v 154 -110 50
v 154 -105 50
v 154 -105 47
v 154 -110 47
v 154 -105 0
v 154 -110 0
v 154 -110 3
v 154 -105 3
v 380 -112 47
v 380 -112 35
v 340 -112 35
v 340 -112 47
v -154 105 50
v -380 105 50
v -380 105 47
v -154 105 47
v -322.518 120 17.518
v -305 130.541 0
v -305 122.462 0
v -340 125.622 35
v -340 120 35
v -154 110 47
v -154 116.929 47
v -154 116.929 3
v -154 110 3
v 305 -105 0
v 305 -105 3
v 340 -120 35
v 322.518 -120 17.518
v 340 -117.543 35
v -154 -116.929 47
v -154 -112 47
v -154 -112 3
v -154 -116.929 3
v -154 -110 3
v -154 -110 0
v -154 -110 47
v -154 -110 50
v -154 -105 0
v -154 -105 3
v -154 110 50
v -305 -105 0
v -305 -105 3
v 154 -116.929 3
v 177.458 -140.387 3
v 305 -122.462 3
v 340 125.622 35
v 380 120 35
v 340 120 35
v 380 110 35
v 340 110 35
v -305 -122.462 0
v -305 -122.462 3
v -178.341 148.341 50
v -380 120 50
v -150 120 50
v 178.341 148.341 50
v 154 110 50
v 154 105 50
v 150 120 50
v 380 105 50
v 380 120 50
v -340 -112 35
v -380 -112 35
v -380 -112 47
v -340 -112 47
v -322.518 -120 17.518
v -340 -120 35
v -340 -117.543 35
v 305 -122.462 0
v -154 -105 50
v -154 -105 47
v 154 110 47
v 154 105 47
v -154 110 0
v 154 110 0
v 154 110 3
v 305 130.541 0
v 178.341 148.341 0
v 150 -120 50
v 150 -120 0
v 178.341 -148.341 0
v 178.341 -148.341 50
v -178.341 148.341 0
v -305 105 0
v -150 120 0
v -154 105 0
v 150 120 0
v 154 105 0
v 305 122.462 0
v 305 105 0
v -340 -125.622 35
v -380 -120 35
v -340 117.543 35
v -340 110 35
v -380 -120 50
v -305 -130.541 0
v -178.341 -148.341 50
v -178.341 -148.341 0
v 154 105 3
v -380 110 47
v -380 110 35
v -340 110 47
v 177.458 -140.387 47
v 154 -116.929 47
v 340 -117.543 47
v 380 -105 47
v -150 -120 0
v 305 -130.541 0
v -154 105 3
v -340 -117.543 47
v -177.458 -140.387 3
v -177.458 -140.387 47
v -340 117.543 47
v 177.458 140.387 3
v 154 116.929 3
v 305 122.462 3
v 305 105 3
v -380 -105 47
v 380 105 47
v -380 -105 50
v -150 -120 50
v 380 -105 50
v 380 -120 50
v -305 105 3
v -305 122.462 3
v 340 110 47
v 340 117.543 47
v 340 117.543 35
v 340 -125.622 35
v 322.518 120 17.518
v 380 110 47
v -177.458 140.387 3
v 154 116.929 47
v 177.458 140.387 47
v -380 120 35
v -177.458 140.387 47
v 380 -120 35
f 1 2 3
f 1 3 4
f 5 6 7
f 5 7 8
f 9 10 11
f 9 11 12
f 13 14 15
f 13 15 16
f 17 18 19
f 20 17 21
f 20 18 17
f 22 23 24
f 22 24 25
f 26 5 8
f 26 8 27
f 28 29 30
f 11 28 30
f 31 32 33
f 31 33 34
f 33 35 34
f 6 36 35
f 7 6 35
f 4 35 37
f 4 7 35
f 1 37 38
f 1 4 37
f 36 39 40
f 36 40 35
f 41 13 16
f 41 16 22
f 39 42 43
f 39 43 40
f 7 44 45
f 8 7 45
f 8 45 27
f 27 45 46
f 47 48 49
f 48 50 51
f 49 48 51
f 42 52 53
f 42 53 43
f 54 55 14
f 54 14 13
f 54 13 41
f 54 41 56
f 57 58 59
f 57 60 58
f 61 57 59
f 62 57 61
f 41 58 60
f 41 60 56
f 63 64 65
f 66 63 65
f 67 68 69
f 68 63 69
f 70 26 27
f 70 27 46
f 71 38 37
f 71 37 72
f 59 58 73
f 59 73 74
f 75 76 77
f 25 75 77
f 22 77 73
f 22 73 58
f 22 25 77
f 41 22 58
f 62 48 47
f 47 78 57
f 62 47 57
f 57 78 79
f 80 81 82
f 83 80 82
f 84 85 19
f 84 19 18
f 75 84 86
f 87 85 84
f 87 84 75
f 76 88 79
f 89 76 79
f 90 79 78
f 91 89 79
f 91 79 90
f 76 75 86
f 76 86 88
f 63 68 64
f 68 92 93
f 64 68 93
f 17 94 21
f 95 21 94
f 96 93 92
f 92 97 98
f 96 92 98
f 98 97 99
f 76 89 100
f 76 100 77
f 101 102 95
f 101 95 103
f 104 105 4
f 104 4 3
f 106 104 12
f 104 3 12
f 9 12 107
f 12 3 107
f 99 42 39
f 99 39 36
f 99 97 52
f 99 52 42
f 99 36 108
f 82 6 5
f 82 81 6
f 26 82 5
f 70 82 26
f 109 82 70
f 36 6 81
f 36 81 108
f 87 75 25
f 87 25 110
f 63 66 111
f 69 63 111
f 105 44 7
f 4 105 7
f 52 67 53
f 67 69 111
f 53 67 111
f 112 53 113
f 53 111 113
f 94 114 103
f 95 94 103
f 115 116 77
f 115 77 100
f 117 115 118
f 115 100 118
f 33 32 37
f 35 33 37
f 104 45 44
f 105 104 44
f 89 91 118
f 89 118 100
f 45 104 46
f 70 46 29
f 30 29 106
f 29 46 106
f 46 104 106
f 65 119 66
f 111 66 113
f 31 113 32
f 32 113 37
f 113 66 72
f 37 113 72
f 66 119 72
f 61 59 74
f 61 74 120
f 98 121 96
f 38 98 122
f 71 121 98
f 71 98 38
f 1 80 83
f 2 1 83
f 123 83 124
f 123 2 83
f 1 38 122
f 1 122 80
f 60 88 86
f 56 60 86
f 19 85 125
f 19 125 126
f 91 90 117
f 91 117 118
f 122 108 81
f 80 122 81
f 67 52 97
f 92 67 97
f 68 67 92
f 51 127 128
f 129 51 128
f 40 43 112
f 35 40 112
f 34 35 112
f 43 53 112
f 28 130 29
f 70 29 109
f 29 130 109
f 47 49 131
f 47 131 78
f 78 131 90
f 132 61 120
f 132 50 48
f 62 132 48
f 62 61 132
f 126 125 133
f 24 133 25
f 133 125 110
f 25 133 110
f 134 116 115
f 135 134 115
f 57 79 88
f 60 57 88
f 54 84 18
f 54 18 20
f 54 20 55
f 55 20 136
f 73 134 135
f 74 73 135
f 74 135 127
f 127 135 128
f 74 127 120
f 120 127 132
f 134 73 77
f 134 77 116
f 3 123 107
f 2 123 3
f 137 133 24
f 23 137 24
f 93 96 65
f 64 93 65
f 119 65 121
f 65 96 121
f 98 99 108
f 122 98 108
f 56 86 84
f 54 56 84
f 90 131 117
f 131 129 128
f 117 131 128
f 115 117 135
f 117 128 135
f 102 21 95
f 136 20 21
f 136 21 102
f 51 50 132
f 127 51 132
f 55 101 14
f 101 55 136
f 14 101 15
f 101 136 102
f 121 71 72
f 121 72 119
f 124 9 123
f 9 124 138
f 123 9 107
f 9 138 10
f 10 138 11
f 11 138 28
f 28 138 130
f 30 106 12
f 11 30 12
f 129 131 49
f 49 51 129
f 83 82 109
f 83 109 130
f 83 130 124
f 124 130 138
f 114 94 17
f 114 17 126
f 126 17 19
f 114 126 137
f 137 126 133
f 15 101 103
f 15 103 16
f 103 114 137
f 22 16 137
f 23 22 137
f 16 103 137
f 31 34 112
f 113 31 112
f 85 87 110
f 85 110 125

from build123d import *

# Parameters (mm, degrees)
F1_DEPTH  = 50
F3_W      = 220
F3_H      = 40
F4_DEPTH  = 760
F5_DEPTH  = 240
F6_W      = 319.9999928474
F6_H      = 220
F6_W_2    = 280
F6_H_2    = 180
F7_DEPTH  = 50
F8_DEPTH  = 435.9292732552
F9_W      = 140
F9_H      = 220
F10_DEPTH = 10
F12_DEPTH = 240
F13_DEPTH = 25
F14_DEPTH = 25
F16_W     = 220
F16_H     = 40
F17_DEPTH = 5
F15_W     = 220
F15_H     = 40
F18_DEPTH = 5
F20_DEPTH = 121.5992048383
F21_DEPTH = 1432.7406287193
F22_DEPTH = 794.6060718969
F23_DEPTH = 848.3018605039
F25_DEPTH = 50
F26_DEPTH = 50
F28_DEPTH = 50
F29_W     = 2
F29_H     = 43.9999995766
F30_DEPTH = 777.0212888718
F31_DEPTH = 308
F32_W     = 40
F32_H     = 5
F33_DEPTH = 3
F35_DEPTH = 3


# Not quite as in the source:
# - ends of sketch curves that miss each other by under 0.0002 mm in the source are joined
# - a feature names something its author has since deleted; it is built from what else it names


with BuildPart() as f1:
    # F0 (on Top) → F1 (new body)
    with BuildSketch(Plane.XY):
        Polygon((-178.3412894642, 148.3412835037), (-380, 120), (-380, -120), (-178.3412894642, -148.3412835037), (-150.0000059605, -120), (150.0000059605, -120), (178.3412894642, -148.3412835037), (380, -120), (380, 120), (178.3412894642, 148.3412835037), (150.0000059605, 120), (-150.0000059605, 120), align=None)
    extrude(amount=F1_DEPTH)

    # F3 (on face) → F4 (cut)
    with BuildSketch(Plane(origin=(-380, 0, 0), x_dir=(0, -1, 0), z_dir=(-1, 0, 0))):
        with Locations((0, 25)):
            Rectangle(F3_W, F3_H)
    extrude(amount=-F4_DEPTH, mode=Mode.SUBTRACT)

    # F2 (on face) → F5 (cut)
    with BuildSketch(Plane.XZ.offset(120)):
        Polygon((305, 0), (380, 0), (380, 35), (340, 35), align=None)
        Polygon((-340, 35), (-380, 35), (-380, 0), (-305, 0), align=None)
    extrude(amount=-F5_DEPTH, mode=Mode.SUBTRACT)

    # F6 (on face) → F7 (cut)
    with BuildSketch(Plane.XY.offset(50)):
        Rectangle(F6_W, F6_H)
        Rectangle(F6_W_2, F6_H_2, mode=Mode.SUBTRACT)
    extrude(amount=-F7_DEPTH, mode=Mode.SUBTRACT)

    # F2 (on face) → F8 (cut, symmetric)
    with BuildSketch(Plane.XZ.offset(120)):
        Polygon((-340, 35), (-380, 35), (-380, 0), (-305, 0), align=None)
        Polygon((305, 0), (380, 0), (380, 35), (340, 35), align=None)
    extrude(amount=F8_DEPTH, both=True, mode=Mode.SUBTRACT)

    # F9 (on face) → F10 (cut)
    with BuildSketch(Plane.XY.offset(50)):
        with Locations((-234.9999964237, 0)):
            Rectangle(F9_W, F9_H)
        with Locations((234.9999964237, 0)):
            Rectangle(F9_W, F9_H)
    extrude(amount=-F10_DEPTH, mode=Mode.SUBTRACT)

    # F13 (cut): a face of the model
    f13_faces = [f1.faces().sort_by_distance(p)[0] for p in [
        (0, 0, 50),
    ]]
    extrude(f13_faces, amount=-F13_DEPTH, mode=Mode.SUBTRACT)

    # F14 (cut): a face of the model
    f14_faces = [f1.faces().sort_by_distance(p)[0] for p in [
        (0, 0, 0),
    ]]
    extrude(f14_faces, amount=-F14_DEPTH, mode=Mode.SUBTRACT)

    # F16 (on face) → F17 (join)
    with BuildSketch(Plane.YZ.offset(-159.9999964237)):
        with Locations((0, 25)):
            Rectangle(F16_W, F16_H)
    extrude(amount=-F17_DEPTH)

    # F15 (on face) → F18 (join)
    with BuildSketch(Plane(origin=(159.9999964237, 0, 0), x_dir=(0, -1, 0), z_dir=(-1, 0, 0))):
        with Locations((0, 25)):
            Rectangle(F15_W, F15_H)
    extrude(amount=-F18_DEPTH)


with BuildPart() as f12:
    # F11 (on face) → F12 (new body)
    with BuildSketch(Plane.XZ.offset(120)):
        Polygon((-305.0000059605, 0), (-305.0000059605, 7.0710678119), (-332.9289381486, 35), (-340.0000059605, 35), align=None)
    extrude(amount=-F12_DEPTH)


with BuildPart() as f12b:
    # F11 (on face) → F12, piece 2 (new body)
    with BuildSketch(Plane.XZ.offset(120)):
        Polygon((340.0000059605, 35), (332.9289381486, 35), (305.0000059605, 7.0710678119), (305.0000059605, 0), align=None)
    extrude(amount=-F12_DEPTH)


with BuildPart() as f1_1:
    add(f1.part)

    # F19: union F12, F12b
    add(f12.part)
    add(f12b.part)

    # F20 (cut): a face of the model
    f20_faces = [f1_1.faces().sort_by_distance(p)[0] for p in [
        (-304.9999964237, 0, 47.5),
    ]]
    extrude(f20_faces, amount=-F20_DEPTH, mode=Mode.SUBTRACT)

    # F21 (cut, symmetric): a face of the model
    f21_faces = [f1_1.faces().sort_by_distance(p)[0] for p in [
        (304.9999964237, 0, 47.5),
    ]]
    extrude(f21_faces, amount=F21_DEPTH, both=True, mode=Mode.SUBTRACT)

    # F22 (cut, symmetric): a face of the model
    f22_faces = [f1_1.faces().sort_by_distance(p)[0] for p in [
        (-164.9999964237, 0, 25),
    ]]
    extrude(f22_faces, amount=F22_DEPTH, both=True, mode=Mode.SUBTRACT)

    # F23 (cut, symmetric): a face of the model
    f23_faces = [f1_1.faces().sort_by_distance(p)[0] for p in [
        (-159.9999964237, 0, 2.5),
    ]]
    extrude(f23_faces, amount=F23_DEPTH, both=True, mode=Mode.SUBTRACT)

    # F24 (on face) → F25 (cut)
    with BuildSketch(Plane(origin=(0, 0, 0), x_dir=(1, 0, 0), z_dir=(0, 0, -1))):
        Polygon((-154.0000059605, -110), (-301, -110), (-301, -123.0241053613), (-177.4578903454, -140.3868165731), (-154.0000059605, -116.9289321881), align=None)
        Polygon((301, -123.0241053613), (301, -110), (154.0000059605, -110), (154.0000059605, -116.9289321881), (177.4578903454, -140.3868165731), align=None)
    extrude(amount=-F25_DEPTH, mode=Mode.SUBTRACT)

    # F24 (on face) → F26 (cut)
    with BuildSketch(Plane(origin=(0, 0, 0), x_dir=(1, 0, 0), z_dir=(0, 0, -1))):
        Polygon((-301, 123.0241053613), (-301, 110), (-154.0000059605, 110), (-154.0000059605, 116.9289321881), (-177.4578903454, 140.3868165731), align=None)
        Polygon((154.0000059605, 116.9289321881), (154.0000059605, 110), (301, 110), (301, 123.0241053613), (177.4578903454, 140.3868165731), align=None)
    extrude(amount=-F26_DEPTH, mode=Mode.SUBTRACT)

    # F27 (on face) → F28 (cut)
    with BuildSketch(Plane.XY.offset(50)):
        Polygon((301, -110), (301, -123.0241053613), (340, -117.5430128079), (340, -110), align=None)
        Polygon((-301, -123.0241053613), (-301, -110), (-340, -110), (-340, -117.5430128079), align=None)
        Polygon((301, 110), (340, 110), (340, 117.5430128079), (301, 123.0241053613), align=None)
        Polygon((-340, 110), (-301, 110), (-301, 123.0241053613), (-340, 117.5430128079), align=None)
    extrude(amount=-F28_DEPTH, mode=Mode.SUBTRACT)

    # F29 (on face) → F30 (cut, symmetric)
    with BuildSketch(Plane.YZ.offset(154.0000059605)):
        with Locations((-111, 25.0000002117)):
            Rectangle(F29_W, F29_H)
    extrude(amount=F30_DEPTH, both=True, mode=Mode.SUBTRACT)

    # F29 (on face) → F31 (join)
    with BuildSketch(Plane.YZ.offset(154.0000059605)):
        with Locations((-111, 25.0000002117)):
            Rectangle(F29_W, F29_H)
    extrude(amount=-F31_DEPTH)

    # F32 (on face) → F33 (join)
    with BuildSketch(Plane.XY.offset(50)):
        Polygon((380, 105), (380, 110), (340, 110), (340, 117.5430128079), (177.4578903454, 140.3868165731), (154.0000059605, 116.9289321881), (154.0000059605, 110), (153.9999940395, 105), (340, 105), align=None)
        Polygon((-340, 117.5430128079), (-340, 110), (-380, 110), (-380, 105), (-340, 105), (-153.9999940395, 105), (-153.9999940395, 110), (-154.0000059605, 116.9289321881), (-177.4578903454, 140.3868165731), align=None)
        Polygon((-154.0000059605, -116.9289321881), (-154.0000059605, -110), (-154.0000059605, -105), (-340, -105), (-340, -110), (-340, -117.5430128079), (-177.4578903454, -140.3868165731), align=None)
        with Locations((-360, -107.5)):
            Rectangle(F32_W, F32_H)
        Polygon((340, -105), (154.0000059605, -105), (154.0000059605, -110), (154.0000059605, -116.9289321881), (177.4578903454, -140.3868165731), (340, -117.5430128079), (340, -110), align=None)
        with Locations((360, -107.5)):
            Rectangle(F32_W, F32_H)
    extrude(amount=-F33_DEPTH)

    # F34 (on face) → F35 (join)
    with BuildSketch(Plane(origin=(0, 0, 0), x_dir=(1, 0, 0), z_dir=(0, 0, -1))):
        Polygon((-154.0000059605, -116.9289321881), (-154.0000059605, -110), (-154.0000059605, -105), (-305, -105), (-305, -110), (-305, -122.4619420225), (-177.4578903454, -140.3868165731), align=None)
        Polygon((-305, 105), (-154.0000059605, 105), (-154.0000059605, 110), (-154.0000059605, 116.9289321881), (-177.4578903454, 140.3868165731), (-305, 122.4619420225), (-305, 110), align=None)
        Polygon((305, -105), (154.0000059605, -105), (154.0000059605, -110), (154.0000059605, -116.9289321881), (177.4578903454, -140.3868165731), (305, -122.4619420225), (305, -110), align=None)
        Polygon((154.0000059605, 110), (154.0000059605, 105), (305, 105), (305, 110), (305, 122.4619420225), (177.4578903454, 140.3868165731), (154.0000059605, 116.9289321881), align=None)
    extrude(amount=-F35_DEPTH)


solid = f1_1.part
